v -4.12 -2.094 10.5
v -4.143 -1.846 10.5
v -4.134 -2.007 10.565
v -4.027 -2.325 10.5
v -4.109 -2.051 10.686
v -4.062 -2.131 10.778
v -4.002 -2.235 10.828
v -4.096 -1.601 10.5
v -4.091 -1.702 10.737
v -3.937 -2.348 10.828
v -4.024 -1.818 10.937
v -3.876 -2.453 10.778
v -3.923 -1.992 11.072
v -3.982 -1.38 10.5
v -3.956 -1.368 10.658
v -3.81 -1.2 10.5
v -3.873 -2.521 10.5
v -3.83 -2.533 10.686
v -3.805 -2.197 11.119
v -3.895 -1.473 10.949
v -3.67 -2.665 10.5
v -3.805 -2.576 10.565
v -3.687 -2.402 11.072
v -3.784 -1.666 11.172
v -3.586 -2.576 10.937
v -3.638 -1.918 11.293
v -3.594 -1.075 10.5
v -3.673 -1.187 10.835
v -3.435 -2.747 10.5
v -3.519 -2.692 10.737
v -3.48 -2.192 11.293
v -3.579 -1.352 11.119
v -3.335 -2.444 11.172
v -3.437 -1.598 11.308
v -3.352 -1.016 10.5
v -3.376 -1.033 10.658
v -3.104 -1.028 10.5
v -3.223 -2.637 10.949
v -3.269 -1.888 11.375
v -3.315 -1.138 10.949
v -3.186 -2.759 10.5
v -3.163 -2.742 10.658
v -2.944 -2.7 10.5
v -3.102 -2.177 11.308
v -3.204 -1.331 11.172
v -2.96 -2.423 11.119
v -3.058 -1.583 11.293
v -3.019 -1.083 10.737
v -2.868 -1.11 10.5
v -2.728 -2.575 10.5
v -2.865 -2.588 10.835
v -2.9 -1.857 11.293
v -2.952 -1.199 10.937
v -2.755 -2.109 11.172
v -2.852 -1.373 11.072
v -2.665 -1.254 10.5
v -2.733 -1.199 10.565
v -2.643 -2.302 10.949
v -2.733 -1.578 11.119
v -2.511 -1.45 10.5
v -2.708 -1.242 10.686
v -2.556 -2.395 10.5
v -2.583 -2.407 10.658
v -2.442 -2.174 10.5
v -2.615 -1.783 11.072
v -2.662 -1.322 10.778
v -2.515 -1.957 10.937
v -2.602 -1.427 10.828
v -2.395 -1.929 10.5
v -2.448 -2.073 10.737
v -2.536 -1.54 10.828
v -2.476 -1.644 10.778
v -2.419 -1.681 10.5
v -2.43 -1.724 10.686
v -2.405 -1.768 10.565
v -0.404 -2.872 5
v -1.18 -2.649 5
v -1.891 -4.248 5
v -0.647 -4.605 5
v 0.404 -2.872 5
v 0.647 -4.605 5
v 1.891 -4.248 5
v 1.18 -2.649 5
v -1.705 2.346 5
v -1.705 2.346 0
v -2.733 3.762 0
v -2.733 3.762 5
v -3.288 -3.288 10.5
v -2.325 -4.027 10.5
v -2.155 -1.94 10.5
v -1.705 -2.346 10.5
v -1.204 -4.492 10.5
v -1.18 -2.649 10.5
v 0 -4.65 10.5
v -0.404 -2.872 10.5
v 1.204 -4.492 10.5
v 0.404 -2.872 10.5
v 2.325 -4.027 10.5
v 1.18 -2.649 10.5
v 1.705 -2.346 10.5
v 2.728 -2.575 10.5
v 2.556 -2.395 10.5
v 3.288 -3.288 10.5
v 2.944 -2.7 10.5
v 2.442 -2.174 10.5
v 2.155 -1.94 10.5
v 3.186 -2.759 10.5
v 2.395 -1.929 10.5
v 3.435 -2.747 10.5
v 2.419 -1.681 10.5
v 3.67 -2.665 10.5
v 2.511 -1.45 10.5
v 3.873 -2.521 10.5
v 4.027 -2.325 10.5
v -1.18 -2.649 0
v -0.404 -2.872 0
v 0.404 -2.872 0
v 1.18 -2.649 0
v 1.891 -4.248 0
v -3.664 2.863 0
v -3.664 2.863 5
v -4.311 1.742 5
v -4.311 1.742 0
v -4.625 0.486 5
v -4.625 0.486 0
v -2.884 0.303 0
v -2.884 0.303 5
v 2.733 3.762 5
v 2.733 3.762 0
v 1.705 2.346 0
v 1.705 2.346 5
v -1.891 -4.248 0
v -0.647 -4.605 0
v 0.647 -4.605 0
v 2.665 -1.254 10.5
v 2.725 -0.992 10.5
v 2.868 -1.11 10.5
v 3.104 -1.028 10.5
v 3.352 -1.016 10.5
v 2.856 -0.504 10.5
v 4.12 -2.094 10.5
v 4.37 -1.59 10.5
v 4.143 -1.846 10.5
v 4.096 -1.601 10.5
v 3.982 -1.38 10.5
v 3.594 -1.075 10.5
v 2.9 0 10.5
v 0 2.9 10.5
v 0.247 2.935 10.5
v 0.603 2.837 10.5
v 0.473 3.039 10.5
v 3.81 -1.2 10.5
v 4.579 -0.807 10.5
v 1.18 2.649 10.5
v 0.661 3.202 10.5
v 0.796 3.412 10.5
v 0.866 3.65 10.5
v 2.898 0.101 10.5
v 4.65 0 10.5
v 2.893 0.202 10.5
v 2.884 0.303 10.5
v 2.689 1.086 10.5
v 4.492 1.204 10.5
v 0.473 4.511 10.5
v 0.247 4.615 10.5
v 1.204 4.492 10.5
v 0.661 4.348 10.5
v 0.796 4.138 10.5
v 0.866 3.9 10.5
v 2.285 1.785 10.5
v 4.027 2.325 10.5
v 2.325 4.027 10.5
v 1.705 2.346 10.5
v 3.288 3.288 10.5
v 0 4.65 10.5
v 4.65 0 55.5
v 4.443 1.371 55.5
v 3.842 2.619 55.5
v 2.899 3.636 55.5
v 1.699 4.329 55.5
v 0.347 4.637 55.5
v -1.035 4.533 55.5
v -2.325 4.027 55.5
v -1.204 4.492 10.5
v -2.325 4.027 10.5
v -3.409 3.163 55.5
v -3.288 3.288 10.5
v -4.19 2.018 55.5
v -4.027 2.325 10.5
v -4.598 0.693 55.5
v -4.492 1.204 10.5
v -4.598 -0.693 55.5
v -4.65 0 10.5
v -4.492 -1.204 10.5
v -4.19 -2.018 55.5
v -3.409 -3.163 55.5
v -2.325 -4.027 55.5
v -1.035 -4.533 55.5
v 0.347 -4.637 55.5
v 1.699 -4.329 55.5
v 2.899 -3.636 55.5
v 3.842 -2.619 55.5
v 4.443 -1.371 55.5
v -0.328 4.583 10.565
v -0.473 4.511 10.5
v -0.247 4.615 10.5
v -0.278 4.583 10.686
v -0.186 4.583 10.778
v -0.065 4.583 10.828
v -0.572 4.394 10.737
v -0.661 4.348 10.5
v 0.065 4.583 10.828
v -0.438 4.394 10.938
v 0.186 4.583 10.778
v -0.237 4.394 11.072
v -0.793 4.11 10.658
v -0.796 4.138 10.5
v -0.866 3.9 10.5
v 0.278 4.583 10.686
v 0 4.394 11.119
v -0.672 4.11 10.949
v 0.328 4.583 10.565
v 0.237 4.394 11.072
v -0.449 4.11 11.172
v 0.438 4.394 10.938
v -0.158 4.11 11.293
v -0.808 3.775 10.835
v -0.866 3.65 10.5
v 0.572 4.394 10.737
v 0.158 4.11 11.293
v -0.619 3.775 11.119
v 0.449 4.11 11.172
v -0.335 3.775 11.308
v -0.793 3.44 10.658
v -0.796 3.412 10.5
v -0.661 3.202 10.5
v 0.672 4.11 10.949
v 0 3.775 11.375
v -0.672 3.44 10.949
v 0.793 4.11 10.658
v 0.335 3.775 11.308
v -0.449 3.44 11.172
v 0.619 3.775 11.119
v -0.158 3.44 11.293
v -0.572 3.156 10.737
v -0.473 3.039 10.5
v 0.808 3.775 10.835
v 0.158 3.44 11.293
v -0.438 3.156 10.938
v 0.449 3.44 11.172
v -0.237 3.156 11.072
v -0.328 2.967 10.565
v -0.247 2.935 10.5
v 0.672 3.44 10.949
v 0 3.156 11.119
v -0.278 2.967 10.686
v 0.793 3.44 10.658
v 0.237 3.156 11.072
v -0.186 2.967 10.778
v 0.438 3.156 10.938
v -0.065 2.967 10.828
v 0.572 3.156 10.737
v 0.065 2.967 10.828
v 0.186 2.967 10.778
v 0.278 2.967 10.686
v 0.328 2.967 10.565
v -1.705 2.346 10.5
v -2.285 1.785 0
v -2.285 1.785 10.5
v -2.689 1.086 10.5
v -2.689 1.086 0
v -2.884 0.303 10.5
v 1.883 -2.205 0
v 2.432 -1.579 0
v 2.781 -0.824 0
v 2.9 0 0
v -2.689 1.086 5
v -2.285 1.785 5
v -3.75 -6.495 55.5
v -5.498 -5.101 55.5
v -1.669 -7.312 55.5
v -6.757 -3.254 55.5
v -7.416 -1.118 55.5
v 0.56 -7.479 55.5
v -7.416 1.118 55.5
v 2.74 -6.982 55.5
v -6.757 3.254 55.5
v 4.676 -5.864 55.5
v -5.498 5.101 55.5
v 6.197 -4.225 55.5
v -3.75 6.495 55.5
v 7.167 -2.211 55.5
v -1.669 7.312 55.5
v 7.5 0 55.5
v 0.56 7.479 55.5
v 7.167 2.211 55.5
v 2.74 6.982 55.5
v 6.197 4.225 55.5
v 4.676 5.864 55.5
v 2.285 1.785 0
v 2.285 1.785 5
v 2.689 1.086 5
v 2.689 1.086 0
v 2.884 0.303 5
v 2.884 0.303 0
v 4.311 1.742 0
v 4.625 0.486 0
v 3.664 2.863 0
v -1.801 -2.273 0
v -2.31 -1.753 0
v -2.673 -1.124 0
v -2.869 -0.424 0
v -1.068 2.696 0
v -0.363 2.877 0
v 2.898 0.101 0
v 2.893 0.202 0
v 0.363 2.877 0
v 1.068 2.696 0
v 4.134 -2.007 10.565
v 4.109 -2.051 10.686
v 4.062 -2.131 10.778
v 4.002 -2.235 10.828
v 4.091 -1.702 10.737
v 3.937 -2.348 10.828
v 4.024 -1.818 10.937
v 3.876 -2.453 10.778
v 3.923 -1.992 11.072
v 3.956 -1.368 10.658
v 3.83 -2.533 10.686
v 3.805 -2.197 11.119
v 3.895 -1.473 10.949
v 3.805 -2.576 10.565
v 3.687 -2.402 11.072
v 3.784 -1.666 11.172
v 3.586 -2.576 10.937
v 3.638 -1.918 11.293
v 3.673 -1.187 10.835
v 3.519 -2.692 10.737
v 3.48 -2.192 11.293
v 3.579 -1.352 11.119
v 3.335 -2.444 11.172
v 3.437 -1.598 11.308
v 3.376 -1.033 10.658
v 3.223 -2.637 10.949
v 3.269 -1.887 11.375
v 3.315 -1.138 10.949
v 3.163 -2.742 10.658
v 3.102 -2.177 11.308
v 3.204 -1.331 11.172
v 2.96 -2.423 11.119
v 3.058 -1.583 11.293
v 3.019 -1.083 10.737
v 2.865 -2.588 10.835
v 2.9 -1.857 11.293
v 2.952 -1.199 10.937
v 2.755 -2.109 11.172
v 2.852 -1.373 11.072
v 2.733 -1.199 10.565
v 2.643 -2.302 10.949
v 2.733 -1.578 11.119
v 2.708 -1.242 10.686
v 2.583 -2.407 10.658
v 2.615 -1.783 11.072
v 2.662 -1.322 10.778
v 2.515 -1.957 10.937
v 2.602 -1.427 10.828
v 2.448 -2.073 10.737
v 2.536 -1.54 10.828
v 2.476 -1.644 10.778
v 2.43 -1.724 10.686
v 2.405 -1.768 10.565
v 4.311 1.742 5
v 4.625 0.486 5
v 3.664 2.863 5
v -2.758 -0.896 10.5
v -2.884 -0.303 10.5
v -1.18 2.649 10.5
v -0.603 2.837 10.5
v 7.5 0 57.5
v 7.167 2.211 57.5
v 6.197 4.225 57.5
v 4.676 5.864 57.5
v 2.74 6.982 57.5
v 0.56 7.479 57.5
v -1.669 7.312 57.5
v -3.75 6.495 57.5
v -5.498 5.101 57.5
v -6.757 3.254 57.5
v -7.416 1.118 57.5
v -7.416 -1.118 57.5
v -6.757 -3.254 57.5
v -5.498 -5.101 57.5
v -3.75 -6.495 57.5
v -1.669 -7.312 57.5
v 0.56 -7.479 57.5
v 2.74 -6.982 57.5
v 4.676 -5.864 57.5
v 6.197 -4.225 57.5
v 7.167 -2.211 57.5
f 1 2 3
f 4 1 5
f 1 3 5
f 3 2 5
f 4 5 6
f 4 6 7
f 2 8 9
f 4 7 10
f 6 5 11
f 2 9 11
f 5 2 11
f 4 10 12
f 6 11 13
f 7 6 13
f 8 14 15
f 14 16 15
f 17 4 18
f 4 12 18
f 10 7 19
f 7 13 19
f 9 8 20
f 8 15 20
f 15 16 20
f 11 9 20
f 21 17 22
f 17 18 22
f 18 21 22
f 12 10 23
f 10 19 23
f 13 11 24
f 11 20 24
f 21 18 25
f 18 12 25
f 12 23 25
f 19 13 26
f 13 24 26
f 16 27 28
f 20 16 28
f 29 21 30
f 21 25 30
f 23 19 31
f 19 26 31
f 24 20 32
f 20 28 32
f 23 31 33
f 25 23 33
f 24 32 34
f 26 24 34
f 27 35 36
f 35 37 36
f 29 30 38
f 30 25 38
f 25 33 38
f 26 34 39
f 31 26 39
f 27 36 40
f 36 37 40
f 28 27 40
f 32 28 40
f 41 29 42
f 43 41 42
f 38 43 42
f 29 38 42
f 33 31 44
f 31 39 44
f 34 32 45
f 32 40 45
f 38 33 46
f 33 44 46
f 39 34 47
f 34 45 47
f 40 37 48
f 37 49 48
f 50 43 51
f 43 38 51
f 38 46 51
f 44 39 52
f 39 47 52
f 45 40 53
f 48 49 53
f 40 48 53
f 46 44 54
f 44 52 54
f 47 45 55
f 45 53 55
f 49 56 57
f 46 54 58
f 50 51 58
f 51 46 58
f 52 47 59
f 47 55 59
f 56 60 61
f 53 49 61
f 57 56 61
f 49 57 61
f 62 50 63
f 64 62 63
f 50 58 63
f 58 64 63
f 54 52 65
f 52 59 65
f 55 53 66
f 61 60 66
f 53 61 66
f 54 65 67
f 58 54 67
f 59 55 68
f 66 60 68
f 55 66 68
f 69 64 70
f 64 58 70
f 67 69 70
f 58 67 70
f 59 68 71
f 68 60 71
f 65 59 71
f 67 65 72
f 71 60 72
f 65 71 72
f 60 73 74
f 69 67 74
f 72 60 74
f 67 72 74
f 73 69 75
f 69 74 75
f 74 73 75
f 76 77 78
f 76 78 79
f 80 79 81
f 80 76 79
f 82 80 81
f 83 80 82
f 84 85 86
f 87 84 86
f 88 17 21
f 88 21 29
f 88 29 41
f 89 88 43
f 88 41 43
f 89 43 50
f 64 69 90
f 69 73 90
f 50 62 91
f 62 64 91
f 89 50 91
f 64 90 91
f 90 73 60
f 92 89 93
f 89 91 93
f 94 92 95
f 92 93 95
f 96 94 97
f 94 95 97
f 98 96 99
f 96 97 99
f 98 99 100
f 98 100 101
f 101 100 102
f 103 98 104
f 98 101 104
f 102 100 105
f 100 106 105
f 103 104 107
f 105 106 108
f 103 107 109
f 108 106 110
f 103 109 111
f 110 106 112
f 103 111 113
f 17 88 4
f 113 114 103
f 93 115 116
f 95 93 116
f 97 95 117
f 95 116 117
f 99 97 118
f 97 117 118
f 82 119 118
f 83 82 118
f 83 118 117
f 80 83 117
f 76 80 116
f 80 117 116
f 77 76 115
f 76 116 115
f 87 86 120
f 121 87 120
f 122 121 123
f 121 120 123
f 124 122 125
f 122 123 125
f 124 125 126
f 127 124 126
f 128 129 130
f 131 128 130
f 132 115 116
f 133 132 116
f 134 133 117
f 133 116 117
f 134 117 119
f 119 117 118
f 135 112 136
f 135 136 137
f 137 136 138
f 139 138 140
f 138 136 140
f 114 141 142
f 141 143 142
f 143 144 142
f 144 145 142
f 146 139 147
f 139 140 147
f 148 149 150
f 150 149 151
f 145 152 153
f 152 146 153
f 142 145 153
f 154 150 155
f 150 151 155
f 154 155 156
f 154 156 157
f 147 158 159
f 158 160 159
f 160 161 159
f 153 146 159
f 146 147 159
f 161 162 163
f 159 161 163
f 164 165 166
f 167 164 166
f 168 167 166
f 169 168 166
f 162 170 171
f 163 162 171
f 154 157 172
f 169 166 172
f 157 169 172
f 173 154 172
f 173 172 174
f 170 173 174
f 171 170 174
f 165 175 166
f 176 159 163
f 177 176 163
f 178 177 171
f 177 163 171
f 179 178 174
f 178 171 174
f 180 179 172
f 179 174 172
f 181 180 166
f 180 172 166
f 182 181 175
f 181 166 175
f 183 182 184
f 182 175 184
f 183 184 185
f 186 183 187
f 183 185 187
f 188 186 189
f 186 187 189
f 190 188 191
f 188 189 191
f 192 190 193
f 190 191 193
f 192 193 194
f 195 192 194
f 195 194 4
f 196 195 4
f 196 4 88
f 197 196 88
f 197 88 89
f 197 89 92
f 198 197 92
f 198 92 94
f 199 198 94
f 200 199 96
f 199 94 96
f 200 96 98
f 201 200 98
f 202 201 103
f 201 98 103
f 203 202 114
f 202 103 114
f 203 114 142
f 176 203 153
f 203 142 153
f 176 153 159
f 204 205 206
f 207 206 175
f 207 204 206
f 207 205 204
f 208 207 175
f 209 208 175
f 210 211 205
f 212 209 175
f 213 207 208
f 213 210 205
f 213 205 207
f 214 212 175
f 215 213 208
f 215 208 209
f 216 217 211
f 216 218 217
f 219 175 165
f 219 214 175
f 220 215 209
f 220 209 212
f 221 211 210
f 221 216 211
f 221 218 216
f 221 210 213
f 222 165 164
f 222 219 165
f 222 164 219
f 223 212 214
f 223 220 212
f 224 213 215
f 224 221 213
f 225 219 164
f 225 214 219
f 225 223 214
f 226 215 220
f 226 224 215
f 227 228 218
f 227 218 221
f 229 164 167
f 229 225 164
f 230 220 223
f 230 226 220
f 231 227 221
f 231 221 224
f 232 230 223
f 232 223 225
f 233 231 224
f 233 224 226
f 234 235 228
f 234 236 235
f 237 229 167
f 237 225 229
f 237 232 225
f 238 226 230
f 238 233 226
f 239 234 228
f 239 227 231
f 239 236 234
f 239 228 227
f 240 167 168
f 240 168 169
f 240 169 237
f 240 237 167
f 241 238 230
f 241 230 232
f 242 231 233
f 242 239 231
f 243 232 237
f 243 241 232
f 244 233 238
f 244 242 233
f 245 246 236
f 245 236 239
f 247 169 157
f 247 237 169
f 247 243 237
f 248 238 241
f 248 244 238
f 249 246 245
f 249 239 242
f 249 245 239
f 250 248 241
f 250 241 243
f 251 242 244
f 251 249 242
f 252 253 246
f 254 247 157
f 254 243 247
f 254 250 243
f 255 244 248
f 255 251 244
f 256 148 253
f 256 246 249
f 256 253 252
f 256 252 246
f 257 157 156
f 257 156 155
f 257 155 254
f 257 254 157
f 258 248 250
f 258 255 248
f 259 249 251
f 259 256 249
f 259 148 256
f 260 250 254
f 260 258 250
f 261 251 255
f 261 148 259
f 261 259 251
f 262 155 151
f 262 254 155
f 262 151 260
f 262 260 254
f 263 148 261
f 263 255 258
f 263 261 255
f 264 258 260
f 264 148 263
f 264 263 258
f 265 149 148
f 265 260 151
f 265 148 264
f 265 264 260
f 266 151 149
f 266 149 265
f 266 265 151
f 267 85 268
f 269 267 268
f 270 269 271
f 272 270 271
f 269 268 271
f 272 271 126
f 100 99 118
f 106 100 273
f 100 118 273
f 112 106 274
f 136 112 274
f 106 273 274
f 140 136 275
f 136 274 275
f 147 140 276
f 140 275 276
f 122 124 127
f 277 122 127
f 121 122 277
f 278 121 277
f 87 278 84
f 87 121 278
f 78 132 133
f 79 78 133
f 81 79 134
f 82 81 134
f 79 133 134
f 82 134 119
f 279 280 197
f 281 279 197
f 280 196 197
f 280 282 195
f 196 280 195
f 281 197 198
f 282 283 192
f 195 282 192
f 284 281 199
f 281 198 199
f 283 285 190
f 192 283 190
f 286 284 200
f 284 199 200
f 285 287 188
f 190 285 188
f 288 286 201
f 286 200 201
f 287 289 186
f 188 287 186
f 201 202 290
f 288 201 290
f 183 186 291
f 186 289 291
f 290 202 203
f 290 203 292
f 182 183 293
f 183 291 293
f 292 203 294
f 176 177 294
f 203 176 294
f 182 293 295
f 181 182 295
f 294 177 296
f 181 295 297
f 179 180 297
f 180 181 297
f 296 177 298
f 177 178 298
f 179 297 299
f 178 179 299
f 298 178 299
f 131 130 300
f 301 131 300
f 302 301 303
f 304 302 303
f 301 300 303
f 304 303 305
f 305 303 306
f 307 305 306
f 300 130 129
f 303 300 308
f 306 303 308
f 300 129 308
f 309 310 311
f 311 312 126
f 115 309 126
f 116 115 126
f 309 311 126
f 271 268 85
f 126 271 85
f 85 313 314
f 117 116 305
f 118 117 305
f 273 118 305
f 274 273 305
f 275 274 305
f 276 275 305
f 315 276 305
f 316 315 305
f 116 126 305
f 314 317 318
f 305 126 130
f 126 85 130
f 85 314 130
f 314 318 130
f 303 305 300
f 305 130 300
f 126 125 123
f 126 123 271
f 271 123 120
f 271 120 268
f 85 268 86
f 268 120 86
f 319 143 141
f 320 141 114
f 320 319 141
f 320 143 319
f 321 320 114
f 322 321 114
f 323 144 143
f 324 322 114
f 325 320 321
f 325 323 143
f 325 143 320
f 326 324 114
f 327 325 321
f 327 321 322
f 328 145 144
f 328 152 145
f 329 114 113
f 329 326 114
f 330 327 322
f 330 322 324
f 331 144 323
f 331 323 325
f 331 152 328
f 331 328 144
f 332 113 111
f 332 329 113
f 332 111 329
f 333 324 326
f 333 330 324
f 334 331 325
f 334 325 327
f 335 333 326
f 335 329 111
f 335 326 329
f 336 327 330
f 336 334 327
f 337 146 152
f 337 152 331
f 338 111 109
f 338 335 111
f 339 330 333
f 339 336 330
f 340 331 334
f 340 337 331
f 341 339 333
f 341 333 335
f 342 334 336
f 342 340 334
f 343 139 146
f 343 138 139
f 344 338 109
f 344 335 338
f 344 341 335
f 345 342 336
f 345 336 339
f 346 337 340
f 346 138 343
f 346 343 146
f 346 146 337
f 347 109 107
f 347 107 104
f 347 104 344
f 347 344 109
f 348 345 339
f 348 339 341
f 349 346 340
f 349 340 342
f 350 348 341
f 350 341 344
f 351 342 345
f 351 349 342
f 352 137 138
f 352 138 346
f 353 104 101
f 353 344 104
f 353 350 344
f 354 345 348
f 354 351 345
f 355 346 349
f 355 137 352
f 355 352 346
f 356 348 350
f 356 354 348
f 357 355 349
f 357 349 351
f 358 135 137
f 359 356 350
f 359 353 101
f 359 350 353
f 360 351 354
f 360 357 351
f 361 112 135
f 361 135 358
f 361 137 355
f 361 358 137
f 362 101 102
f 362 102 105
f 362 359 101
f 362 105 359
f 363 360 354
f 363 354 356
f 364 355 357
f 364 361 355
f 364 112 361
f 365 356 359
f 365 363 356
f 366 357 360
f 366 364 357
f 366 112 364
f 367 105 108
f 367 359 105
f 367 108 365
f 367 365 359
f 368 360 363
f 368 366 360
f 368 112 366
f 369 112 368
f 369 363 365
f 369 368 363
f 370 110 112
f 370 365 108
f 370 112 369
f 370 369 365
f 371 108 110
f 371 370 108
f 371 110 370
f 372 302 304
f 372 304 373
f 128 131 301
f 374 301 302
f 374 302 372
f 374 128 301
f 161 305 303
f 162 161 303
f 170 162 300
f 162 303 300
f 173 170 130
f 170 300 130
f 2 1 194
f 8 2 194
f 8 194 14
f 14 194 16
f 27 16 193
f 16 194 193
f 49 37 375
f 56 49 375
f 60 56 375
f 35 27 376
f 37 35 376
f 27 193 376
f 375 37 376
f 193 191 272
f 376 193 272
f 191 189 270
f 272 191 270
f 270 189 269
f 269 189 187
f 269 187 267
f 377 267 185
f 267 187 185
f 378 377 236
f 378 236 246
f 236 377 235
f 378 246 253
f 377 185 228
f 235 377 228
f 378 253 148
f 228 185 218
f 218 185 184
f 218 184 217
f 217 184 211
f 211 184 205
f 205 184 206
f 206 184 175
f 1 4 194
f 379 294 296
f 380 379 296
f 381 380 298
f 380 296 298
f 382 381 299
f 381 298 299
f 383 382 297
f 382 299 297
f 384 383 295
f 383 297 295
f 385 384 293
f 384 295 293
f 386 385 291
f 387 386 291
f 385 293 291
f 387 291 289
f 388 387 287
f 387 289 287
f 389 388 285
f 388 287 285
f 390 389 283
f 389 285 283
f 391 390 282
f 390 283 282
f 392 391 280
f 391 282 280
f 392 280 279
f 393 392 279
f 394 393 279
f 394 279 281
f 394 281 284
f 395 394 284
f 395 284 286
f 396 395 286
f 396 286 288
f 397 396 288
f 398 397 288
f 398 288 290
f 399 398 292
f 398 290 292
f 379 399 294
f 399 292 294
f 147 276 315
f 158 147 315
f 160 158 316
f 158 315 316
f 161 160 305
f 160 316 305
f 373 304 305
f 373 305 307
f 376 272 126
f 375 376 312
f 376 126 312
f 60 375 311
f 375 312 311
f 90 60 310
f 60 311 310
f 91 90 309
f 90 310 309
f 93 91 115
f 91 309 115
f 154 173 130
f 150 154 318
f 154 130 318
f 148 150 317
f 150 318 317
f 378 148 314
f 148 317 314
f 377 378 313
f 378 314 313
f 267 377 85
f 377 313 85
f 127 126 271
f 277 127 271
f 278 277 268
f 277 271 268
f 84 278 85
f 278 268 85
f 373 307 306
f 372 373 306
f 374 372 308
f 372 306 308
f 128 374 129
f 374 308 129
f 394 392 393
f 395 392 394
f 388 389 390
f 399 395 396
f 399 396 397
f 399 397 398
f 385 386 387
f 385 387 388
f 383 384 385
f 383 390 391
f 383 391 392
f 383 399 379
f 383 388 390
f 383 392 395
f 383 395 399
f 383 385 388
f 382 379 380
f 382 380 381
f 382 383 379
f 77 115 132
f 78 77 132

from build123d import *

# Parameters (mm, degrees)
F1_DEPTH = 5
F2_DEPTH = 10.5
F3_R     = 4.65
F3_R_2   = 2.9
F4_DEPTH = 45
F5_R     = 7.5
F5_R_2   = 4.65
F6_DEPTH = 2


with BuildPart() as f1:
    # F0 (on Top) → F1 (new body)
    with BuildSketch(Plane.XY):
        with BuildLine():
            Line((-1.704577, 2.346149), (-2.733201, 3.761929))
            ThreePointArc((-2.733201, 3.761929), (-4.027018, 2.325), (-4.624527, 0.486057))
            Line((-4.624527, 0.486057), (-2.884113, 0.303133))
            ThreePointArc((-2.884113, 0.303133), (-2.511474, 1.45), (-1.704577, 2.346149))
        make_face()
        with BuildLine():
            Line((2.733201, 3.761929), (1.704577, 2.346149))
            ThreePointArc((1.704577, 2.346149), (2.511474, 1.45), (2.884113, 0.303133))
            Line((2.884113, 0.303133), (4.624527, 0.486057))
            ThreePointArc((4.624527, 0.486057), (4.027018, 2.325), (2.733201, 3.761929))
        make_face()
        with BuildLine():
            ThreePointArc((1.179536, -2.649282), (0, -2.9), (-1.179536, -2.649282))
            Line((-1.179536, -2.649282), (-1.891325, -4.247986))
            ThreePointArc((-1.891325, -4.247986), (0, -4.65), (1.891325, -4.247986))
            Line((1.891325, -4.247986), (1.179536, -2.649282))
        make_face()
    extrude(amount=F1_DEPTH)


with BuildPart() as f2:
    # F0 (on Top) → F2 (new body)
    with BuildSketch(Plane.XY):
        with BuildLine():
            ThreePointArc((1.704577, 2.346149), (0, 2.9), (-1.704577, 2.346149))
            ThreePointArc((-1.704577, 2.346149), (-2.511474, 1.45), (-2.884113, 0.303133))
            ThreePointArc((-2.884113, 0.303133), (-2.511474, -1.45), (-1.179536, -2.649282))
            ThreePointArc((-1.179536, -2.649282), (0, -2.9), (1.179536, -2.649282))
            ThreePointArc((1.179536, -2.649282), (2.432145, -1.579453), (2.9, 0))
            ThreePointArc((2.9, 0), (2.896026, 0.151774), (2.884113, 0.303133))
            ThreePointArc((2.884113, 0.303133), (2.511474, 1.45), (1.704577, 2.346149))
        make_face()
    extrude(amount=F2_DEPTH)

    # F3 (on face) → F4 (join)
    with BuildSketch(Plane.XY.offset(10.5)):
        Circle(F3_R)
        Circle(F3_R_2, mode=Mode.SUBTRACT)
        Circle(F3_R_2)
    extrude(amount=F4_DEPTH)

    # F5 (on face) → F6 (join)
    with BuildSketch(Plane.XY.offset(55.5)):
        Circle(F5_R)
        Circle(F5_R_2, mode=Mode.SUBTRACT)
        Circle(F5_R_2)
    extrude(amount=F6_DEPTH)

    # F7 (on face) → F8 (revolve, cut)
    with BuildSketch(Plane(origin=(0, 0, 10.5), x_dir=(1, 0, 0), z_dir=(0, 0, -1))):
        with BuildLine():
            Line((-2.511474, 1.45), (-4.027018, 2.325))
            ThreePointArc((-4.027018, 2.325), (-3.706746, 1.129728), (-2.511474, 1.45))
        make_face()
    revolve(axis=Axis((-3.269246, -1.8875, 10.5), (0.866025, 0.5, 0)), mode=Mode.SUBTRACT)

    # F7 (on face) → F9 (revolve, cut)
    with BuildSketch(Plane(origin=(0, 0, 10.5), x_dir=(1, 0, 0), z_dir=(0, 0, -1))):
        with BuildLine():
            Line((2.511474, 1.45), (4.027018, 2.325))
            ThreePointArc((4.027018, 2.325), (2.831746, 2.645272), (2.511474, 1.45))
        make_face()
    revolve(axis=Axis((3.269246, -1.8875, 10.5), (0.866025, -0.5, 0)), mode=Mode.SUBTRACT)

    # F7 (on face) → F10 (revolve, cut)
    with BuildSketch(Plane(origin=(0, 0, 10.5), x_dir=(1, 0, 0), z_dir=(0, 0, -1))):
        with BuildLine():
            Line((0, -2.9), (0, -4.65))
            ThreePointArc((0, -4.65), (0.875, -3.775), (0, -2.9))
        make_face()
    revolve(axis=Axis((0, 3.775, 10.5), (0, 1, 0)), mode=Mode.SUBTRACT)


solid = Compound([f1.part, f2.part])
